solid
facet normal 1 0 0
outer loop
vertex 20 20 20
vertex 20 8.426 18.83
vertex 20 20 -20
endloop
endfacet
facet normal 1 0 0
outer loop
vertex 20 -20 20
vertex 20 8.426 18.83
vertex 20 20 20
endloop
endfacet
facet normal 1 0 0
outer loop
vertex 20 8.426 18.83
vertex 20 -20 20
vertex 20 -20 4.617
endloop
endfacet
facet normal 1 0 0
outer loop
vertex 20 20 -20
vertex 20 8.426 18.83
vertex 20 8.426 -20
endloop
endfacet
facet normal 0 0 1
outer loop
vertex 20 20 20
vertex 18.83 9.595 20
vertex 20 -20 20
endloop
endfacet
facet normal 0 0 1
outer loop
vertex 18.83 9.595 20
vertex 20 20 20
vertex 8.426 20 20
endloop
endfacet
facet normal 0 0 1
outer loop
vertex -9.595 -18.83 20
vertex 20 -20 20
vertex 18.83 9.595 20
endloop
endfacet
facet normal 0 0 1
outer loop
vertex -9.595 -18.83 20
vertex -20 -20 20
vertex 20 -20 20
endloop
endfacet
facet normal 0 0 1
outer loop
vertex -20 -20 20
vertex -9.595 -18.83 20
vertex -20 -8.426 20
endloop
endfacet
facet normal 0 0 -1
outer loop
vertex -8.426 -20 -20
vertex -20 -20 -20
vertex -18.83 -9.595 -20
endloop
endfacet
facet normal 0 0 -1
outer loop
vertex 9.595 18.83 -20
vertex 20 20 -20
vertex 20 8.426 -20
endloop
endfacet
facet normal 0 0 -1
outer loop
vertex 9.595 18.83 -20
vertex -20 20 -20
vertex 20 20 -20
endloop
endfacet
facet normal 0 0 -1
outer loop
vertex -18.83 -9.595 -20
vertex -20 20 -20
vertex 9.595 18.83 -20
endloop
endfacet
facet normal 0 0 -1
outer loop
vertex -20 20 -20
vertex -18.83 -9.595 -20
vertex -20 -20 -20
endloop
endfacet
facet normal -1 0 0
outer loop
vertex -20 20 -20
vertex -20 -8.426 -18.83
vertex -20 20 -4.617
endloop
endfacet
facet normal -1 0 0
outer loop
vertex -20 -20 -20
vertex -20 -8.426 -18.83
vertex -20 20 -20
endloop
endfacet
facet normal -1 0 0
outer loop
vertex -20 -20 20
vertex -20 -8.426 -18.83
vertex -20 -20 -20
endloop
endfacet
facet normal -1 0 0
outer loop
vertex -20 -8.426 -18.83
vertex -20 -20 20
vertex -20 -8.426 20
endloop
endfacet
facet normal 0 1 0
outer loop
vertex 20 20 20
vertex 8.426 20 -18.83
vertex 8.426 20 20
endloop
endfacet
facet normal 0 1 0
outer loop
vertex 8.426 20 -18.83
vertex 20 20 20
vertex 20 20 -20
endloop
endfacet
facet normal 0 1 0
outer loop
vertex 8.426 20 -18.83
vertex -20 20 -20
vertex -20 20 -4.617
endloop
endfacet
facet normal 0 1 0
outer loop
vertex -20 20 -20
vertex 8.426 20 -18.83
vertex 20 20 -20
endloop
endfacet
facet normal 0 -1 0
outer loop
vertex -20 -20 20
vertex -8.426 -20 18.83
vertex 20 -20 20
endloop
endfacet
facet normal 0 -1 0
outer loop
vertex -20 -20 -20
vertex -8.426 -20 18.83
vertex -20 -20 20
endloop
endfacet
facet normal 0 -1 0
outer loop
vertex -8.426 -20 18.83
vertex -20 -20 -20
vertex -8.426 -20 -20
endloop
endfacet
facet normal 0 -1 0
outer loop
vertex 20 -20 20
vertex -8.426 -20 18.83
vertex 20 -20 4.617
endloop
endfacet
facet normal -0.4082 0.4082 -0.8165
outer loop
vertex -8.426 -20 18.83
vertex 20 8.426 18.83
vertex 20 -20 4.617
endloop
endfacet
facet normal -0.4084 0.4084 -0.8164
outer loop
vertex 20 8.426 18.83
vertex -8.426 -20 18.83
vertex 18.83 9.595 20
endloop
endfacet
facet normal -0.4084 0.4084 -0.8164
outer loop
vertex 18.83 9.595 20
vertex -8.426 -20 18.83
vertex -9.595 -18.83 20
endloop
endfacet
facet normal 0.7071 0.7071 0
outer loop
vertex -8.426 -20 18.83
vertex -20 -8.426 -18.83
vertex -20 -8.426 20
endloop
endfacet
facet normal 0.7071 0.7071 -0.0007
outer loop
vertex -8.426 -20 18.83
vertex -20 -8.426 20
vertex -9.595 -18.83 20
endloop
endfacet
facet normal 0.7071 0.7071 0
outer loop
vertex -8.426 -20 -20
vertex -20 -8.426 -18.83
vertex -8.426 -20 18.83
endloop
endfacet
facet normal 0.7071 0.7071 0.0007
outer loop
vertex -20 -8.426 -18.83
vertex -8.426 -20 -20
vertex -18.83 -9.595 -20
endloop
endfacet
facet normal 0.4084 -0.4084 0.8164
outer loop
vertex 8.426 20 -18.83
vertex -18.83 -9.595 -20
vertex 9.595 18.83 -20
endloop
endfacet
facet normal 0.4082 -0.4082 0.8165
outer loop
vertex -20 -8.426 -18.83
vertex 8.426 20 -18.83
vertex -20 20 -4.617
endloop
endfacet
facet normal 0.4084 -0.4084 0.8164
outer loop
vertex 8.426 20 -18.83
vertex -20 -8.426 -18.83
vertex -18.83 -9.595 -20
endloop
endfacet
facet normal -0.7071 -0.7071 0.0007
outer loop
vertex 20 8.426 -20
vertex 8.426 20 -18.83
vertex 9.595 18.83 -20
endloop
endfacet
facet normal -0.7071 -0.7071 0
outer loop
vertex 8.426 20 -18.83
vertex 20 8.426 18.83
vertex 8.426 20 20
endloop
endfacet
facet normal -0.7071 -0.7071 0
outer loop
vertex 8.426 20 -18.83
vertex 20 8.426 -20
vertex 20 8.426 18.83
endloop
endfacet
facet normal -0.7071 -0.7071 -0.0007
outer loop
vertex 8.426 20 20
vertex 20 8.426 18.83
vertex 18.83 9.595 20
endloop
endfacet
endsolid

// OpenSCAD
// Corner-up demo: inner cube’s body diagonal is vertical
s = 40;
eps = 0.1;
phi = atan(1/sqrt(2)); // ≈ 35.26438968° (angle from face normal to body diagonal)

difference() {
  cube([s,s,s], center=true);

  // First twist 45° around Z so a face diagonal aligns to X/Y,
  // then tilt by phi to aim a body diagonal along Z.
  rotate([0,0,45])
    rotate([phi,0,0])
      #cube([s+2*eps, 2*s+2*eps, s+2*eps], center=true);
}
